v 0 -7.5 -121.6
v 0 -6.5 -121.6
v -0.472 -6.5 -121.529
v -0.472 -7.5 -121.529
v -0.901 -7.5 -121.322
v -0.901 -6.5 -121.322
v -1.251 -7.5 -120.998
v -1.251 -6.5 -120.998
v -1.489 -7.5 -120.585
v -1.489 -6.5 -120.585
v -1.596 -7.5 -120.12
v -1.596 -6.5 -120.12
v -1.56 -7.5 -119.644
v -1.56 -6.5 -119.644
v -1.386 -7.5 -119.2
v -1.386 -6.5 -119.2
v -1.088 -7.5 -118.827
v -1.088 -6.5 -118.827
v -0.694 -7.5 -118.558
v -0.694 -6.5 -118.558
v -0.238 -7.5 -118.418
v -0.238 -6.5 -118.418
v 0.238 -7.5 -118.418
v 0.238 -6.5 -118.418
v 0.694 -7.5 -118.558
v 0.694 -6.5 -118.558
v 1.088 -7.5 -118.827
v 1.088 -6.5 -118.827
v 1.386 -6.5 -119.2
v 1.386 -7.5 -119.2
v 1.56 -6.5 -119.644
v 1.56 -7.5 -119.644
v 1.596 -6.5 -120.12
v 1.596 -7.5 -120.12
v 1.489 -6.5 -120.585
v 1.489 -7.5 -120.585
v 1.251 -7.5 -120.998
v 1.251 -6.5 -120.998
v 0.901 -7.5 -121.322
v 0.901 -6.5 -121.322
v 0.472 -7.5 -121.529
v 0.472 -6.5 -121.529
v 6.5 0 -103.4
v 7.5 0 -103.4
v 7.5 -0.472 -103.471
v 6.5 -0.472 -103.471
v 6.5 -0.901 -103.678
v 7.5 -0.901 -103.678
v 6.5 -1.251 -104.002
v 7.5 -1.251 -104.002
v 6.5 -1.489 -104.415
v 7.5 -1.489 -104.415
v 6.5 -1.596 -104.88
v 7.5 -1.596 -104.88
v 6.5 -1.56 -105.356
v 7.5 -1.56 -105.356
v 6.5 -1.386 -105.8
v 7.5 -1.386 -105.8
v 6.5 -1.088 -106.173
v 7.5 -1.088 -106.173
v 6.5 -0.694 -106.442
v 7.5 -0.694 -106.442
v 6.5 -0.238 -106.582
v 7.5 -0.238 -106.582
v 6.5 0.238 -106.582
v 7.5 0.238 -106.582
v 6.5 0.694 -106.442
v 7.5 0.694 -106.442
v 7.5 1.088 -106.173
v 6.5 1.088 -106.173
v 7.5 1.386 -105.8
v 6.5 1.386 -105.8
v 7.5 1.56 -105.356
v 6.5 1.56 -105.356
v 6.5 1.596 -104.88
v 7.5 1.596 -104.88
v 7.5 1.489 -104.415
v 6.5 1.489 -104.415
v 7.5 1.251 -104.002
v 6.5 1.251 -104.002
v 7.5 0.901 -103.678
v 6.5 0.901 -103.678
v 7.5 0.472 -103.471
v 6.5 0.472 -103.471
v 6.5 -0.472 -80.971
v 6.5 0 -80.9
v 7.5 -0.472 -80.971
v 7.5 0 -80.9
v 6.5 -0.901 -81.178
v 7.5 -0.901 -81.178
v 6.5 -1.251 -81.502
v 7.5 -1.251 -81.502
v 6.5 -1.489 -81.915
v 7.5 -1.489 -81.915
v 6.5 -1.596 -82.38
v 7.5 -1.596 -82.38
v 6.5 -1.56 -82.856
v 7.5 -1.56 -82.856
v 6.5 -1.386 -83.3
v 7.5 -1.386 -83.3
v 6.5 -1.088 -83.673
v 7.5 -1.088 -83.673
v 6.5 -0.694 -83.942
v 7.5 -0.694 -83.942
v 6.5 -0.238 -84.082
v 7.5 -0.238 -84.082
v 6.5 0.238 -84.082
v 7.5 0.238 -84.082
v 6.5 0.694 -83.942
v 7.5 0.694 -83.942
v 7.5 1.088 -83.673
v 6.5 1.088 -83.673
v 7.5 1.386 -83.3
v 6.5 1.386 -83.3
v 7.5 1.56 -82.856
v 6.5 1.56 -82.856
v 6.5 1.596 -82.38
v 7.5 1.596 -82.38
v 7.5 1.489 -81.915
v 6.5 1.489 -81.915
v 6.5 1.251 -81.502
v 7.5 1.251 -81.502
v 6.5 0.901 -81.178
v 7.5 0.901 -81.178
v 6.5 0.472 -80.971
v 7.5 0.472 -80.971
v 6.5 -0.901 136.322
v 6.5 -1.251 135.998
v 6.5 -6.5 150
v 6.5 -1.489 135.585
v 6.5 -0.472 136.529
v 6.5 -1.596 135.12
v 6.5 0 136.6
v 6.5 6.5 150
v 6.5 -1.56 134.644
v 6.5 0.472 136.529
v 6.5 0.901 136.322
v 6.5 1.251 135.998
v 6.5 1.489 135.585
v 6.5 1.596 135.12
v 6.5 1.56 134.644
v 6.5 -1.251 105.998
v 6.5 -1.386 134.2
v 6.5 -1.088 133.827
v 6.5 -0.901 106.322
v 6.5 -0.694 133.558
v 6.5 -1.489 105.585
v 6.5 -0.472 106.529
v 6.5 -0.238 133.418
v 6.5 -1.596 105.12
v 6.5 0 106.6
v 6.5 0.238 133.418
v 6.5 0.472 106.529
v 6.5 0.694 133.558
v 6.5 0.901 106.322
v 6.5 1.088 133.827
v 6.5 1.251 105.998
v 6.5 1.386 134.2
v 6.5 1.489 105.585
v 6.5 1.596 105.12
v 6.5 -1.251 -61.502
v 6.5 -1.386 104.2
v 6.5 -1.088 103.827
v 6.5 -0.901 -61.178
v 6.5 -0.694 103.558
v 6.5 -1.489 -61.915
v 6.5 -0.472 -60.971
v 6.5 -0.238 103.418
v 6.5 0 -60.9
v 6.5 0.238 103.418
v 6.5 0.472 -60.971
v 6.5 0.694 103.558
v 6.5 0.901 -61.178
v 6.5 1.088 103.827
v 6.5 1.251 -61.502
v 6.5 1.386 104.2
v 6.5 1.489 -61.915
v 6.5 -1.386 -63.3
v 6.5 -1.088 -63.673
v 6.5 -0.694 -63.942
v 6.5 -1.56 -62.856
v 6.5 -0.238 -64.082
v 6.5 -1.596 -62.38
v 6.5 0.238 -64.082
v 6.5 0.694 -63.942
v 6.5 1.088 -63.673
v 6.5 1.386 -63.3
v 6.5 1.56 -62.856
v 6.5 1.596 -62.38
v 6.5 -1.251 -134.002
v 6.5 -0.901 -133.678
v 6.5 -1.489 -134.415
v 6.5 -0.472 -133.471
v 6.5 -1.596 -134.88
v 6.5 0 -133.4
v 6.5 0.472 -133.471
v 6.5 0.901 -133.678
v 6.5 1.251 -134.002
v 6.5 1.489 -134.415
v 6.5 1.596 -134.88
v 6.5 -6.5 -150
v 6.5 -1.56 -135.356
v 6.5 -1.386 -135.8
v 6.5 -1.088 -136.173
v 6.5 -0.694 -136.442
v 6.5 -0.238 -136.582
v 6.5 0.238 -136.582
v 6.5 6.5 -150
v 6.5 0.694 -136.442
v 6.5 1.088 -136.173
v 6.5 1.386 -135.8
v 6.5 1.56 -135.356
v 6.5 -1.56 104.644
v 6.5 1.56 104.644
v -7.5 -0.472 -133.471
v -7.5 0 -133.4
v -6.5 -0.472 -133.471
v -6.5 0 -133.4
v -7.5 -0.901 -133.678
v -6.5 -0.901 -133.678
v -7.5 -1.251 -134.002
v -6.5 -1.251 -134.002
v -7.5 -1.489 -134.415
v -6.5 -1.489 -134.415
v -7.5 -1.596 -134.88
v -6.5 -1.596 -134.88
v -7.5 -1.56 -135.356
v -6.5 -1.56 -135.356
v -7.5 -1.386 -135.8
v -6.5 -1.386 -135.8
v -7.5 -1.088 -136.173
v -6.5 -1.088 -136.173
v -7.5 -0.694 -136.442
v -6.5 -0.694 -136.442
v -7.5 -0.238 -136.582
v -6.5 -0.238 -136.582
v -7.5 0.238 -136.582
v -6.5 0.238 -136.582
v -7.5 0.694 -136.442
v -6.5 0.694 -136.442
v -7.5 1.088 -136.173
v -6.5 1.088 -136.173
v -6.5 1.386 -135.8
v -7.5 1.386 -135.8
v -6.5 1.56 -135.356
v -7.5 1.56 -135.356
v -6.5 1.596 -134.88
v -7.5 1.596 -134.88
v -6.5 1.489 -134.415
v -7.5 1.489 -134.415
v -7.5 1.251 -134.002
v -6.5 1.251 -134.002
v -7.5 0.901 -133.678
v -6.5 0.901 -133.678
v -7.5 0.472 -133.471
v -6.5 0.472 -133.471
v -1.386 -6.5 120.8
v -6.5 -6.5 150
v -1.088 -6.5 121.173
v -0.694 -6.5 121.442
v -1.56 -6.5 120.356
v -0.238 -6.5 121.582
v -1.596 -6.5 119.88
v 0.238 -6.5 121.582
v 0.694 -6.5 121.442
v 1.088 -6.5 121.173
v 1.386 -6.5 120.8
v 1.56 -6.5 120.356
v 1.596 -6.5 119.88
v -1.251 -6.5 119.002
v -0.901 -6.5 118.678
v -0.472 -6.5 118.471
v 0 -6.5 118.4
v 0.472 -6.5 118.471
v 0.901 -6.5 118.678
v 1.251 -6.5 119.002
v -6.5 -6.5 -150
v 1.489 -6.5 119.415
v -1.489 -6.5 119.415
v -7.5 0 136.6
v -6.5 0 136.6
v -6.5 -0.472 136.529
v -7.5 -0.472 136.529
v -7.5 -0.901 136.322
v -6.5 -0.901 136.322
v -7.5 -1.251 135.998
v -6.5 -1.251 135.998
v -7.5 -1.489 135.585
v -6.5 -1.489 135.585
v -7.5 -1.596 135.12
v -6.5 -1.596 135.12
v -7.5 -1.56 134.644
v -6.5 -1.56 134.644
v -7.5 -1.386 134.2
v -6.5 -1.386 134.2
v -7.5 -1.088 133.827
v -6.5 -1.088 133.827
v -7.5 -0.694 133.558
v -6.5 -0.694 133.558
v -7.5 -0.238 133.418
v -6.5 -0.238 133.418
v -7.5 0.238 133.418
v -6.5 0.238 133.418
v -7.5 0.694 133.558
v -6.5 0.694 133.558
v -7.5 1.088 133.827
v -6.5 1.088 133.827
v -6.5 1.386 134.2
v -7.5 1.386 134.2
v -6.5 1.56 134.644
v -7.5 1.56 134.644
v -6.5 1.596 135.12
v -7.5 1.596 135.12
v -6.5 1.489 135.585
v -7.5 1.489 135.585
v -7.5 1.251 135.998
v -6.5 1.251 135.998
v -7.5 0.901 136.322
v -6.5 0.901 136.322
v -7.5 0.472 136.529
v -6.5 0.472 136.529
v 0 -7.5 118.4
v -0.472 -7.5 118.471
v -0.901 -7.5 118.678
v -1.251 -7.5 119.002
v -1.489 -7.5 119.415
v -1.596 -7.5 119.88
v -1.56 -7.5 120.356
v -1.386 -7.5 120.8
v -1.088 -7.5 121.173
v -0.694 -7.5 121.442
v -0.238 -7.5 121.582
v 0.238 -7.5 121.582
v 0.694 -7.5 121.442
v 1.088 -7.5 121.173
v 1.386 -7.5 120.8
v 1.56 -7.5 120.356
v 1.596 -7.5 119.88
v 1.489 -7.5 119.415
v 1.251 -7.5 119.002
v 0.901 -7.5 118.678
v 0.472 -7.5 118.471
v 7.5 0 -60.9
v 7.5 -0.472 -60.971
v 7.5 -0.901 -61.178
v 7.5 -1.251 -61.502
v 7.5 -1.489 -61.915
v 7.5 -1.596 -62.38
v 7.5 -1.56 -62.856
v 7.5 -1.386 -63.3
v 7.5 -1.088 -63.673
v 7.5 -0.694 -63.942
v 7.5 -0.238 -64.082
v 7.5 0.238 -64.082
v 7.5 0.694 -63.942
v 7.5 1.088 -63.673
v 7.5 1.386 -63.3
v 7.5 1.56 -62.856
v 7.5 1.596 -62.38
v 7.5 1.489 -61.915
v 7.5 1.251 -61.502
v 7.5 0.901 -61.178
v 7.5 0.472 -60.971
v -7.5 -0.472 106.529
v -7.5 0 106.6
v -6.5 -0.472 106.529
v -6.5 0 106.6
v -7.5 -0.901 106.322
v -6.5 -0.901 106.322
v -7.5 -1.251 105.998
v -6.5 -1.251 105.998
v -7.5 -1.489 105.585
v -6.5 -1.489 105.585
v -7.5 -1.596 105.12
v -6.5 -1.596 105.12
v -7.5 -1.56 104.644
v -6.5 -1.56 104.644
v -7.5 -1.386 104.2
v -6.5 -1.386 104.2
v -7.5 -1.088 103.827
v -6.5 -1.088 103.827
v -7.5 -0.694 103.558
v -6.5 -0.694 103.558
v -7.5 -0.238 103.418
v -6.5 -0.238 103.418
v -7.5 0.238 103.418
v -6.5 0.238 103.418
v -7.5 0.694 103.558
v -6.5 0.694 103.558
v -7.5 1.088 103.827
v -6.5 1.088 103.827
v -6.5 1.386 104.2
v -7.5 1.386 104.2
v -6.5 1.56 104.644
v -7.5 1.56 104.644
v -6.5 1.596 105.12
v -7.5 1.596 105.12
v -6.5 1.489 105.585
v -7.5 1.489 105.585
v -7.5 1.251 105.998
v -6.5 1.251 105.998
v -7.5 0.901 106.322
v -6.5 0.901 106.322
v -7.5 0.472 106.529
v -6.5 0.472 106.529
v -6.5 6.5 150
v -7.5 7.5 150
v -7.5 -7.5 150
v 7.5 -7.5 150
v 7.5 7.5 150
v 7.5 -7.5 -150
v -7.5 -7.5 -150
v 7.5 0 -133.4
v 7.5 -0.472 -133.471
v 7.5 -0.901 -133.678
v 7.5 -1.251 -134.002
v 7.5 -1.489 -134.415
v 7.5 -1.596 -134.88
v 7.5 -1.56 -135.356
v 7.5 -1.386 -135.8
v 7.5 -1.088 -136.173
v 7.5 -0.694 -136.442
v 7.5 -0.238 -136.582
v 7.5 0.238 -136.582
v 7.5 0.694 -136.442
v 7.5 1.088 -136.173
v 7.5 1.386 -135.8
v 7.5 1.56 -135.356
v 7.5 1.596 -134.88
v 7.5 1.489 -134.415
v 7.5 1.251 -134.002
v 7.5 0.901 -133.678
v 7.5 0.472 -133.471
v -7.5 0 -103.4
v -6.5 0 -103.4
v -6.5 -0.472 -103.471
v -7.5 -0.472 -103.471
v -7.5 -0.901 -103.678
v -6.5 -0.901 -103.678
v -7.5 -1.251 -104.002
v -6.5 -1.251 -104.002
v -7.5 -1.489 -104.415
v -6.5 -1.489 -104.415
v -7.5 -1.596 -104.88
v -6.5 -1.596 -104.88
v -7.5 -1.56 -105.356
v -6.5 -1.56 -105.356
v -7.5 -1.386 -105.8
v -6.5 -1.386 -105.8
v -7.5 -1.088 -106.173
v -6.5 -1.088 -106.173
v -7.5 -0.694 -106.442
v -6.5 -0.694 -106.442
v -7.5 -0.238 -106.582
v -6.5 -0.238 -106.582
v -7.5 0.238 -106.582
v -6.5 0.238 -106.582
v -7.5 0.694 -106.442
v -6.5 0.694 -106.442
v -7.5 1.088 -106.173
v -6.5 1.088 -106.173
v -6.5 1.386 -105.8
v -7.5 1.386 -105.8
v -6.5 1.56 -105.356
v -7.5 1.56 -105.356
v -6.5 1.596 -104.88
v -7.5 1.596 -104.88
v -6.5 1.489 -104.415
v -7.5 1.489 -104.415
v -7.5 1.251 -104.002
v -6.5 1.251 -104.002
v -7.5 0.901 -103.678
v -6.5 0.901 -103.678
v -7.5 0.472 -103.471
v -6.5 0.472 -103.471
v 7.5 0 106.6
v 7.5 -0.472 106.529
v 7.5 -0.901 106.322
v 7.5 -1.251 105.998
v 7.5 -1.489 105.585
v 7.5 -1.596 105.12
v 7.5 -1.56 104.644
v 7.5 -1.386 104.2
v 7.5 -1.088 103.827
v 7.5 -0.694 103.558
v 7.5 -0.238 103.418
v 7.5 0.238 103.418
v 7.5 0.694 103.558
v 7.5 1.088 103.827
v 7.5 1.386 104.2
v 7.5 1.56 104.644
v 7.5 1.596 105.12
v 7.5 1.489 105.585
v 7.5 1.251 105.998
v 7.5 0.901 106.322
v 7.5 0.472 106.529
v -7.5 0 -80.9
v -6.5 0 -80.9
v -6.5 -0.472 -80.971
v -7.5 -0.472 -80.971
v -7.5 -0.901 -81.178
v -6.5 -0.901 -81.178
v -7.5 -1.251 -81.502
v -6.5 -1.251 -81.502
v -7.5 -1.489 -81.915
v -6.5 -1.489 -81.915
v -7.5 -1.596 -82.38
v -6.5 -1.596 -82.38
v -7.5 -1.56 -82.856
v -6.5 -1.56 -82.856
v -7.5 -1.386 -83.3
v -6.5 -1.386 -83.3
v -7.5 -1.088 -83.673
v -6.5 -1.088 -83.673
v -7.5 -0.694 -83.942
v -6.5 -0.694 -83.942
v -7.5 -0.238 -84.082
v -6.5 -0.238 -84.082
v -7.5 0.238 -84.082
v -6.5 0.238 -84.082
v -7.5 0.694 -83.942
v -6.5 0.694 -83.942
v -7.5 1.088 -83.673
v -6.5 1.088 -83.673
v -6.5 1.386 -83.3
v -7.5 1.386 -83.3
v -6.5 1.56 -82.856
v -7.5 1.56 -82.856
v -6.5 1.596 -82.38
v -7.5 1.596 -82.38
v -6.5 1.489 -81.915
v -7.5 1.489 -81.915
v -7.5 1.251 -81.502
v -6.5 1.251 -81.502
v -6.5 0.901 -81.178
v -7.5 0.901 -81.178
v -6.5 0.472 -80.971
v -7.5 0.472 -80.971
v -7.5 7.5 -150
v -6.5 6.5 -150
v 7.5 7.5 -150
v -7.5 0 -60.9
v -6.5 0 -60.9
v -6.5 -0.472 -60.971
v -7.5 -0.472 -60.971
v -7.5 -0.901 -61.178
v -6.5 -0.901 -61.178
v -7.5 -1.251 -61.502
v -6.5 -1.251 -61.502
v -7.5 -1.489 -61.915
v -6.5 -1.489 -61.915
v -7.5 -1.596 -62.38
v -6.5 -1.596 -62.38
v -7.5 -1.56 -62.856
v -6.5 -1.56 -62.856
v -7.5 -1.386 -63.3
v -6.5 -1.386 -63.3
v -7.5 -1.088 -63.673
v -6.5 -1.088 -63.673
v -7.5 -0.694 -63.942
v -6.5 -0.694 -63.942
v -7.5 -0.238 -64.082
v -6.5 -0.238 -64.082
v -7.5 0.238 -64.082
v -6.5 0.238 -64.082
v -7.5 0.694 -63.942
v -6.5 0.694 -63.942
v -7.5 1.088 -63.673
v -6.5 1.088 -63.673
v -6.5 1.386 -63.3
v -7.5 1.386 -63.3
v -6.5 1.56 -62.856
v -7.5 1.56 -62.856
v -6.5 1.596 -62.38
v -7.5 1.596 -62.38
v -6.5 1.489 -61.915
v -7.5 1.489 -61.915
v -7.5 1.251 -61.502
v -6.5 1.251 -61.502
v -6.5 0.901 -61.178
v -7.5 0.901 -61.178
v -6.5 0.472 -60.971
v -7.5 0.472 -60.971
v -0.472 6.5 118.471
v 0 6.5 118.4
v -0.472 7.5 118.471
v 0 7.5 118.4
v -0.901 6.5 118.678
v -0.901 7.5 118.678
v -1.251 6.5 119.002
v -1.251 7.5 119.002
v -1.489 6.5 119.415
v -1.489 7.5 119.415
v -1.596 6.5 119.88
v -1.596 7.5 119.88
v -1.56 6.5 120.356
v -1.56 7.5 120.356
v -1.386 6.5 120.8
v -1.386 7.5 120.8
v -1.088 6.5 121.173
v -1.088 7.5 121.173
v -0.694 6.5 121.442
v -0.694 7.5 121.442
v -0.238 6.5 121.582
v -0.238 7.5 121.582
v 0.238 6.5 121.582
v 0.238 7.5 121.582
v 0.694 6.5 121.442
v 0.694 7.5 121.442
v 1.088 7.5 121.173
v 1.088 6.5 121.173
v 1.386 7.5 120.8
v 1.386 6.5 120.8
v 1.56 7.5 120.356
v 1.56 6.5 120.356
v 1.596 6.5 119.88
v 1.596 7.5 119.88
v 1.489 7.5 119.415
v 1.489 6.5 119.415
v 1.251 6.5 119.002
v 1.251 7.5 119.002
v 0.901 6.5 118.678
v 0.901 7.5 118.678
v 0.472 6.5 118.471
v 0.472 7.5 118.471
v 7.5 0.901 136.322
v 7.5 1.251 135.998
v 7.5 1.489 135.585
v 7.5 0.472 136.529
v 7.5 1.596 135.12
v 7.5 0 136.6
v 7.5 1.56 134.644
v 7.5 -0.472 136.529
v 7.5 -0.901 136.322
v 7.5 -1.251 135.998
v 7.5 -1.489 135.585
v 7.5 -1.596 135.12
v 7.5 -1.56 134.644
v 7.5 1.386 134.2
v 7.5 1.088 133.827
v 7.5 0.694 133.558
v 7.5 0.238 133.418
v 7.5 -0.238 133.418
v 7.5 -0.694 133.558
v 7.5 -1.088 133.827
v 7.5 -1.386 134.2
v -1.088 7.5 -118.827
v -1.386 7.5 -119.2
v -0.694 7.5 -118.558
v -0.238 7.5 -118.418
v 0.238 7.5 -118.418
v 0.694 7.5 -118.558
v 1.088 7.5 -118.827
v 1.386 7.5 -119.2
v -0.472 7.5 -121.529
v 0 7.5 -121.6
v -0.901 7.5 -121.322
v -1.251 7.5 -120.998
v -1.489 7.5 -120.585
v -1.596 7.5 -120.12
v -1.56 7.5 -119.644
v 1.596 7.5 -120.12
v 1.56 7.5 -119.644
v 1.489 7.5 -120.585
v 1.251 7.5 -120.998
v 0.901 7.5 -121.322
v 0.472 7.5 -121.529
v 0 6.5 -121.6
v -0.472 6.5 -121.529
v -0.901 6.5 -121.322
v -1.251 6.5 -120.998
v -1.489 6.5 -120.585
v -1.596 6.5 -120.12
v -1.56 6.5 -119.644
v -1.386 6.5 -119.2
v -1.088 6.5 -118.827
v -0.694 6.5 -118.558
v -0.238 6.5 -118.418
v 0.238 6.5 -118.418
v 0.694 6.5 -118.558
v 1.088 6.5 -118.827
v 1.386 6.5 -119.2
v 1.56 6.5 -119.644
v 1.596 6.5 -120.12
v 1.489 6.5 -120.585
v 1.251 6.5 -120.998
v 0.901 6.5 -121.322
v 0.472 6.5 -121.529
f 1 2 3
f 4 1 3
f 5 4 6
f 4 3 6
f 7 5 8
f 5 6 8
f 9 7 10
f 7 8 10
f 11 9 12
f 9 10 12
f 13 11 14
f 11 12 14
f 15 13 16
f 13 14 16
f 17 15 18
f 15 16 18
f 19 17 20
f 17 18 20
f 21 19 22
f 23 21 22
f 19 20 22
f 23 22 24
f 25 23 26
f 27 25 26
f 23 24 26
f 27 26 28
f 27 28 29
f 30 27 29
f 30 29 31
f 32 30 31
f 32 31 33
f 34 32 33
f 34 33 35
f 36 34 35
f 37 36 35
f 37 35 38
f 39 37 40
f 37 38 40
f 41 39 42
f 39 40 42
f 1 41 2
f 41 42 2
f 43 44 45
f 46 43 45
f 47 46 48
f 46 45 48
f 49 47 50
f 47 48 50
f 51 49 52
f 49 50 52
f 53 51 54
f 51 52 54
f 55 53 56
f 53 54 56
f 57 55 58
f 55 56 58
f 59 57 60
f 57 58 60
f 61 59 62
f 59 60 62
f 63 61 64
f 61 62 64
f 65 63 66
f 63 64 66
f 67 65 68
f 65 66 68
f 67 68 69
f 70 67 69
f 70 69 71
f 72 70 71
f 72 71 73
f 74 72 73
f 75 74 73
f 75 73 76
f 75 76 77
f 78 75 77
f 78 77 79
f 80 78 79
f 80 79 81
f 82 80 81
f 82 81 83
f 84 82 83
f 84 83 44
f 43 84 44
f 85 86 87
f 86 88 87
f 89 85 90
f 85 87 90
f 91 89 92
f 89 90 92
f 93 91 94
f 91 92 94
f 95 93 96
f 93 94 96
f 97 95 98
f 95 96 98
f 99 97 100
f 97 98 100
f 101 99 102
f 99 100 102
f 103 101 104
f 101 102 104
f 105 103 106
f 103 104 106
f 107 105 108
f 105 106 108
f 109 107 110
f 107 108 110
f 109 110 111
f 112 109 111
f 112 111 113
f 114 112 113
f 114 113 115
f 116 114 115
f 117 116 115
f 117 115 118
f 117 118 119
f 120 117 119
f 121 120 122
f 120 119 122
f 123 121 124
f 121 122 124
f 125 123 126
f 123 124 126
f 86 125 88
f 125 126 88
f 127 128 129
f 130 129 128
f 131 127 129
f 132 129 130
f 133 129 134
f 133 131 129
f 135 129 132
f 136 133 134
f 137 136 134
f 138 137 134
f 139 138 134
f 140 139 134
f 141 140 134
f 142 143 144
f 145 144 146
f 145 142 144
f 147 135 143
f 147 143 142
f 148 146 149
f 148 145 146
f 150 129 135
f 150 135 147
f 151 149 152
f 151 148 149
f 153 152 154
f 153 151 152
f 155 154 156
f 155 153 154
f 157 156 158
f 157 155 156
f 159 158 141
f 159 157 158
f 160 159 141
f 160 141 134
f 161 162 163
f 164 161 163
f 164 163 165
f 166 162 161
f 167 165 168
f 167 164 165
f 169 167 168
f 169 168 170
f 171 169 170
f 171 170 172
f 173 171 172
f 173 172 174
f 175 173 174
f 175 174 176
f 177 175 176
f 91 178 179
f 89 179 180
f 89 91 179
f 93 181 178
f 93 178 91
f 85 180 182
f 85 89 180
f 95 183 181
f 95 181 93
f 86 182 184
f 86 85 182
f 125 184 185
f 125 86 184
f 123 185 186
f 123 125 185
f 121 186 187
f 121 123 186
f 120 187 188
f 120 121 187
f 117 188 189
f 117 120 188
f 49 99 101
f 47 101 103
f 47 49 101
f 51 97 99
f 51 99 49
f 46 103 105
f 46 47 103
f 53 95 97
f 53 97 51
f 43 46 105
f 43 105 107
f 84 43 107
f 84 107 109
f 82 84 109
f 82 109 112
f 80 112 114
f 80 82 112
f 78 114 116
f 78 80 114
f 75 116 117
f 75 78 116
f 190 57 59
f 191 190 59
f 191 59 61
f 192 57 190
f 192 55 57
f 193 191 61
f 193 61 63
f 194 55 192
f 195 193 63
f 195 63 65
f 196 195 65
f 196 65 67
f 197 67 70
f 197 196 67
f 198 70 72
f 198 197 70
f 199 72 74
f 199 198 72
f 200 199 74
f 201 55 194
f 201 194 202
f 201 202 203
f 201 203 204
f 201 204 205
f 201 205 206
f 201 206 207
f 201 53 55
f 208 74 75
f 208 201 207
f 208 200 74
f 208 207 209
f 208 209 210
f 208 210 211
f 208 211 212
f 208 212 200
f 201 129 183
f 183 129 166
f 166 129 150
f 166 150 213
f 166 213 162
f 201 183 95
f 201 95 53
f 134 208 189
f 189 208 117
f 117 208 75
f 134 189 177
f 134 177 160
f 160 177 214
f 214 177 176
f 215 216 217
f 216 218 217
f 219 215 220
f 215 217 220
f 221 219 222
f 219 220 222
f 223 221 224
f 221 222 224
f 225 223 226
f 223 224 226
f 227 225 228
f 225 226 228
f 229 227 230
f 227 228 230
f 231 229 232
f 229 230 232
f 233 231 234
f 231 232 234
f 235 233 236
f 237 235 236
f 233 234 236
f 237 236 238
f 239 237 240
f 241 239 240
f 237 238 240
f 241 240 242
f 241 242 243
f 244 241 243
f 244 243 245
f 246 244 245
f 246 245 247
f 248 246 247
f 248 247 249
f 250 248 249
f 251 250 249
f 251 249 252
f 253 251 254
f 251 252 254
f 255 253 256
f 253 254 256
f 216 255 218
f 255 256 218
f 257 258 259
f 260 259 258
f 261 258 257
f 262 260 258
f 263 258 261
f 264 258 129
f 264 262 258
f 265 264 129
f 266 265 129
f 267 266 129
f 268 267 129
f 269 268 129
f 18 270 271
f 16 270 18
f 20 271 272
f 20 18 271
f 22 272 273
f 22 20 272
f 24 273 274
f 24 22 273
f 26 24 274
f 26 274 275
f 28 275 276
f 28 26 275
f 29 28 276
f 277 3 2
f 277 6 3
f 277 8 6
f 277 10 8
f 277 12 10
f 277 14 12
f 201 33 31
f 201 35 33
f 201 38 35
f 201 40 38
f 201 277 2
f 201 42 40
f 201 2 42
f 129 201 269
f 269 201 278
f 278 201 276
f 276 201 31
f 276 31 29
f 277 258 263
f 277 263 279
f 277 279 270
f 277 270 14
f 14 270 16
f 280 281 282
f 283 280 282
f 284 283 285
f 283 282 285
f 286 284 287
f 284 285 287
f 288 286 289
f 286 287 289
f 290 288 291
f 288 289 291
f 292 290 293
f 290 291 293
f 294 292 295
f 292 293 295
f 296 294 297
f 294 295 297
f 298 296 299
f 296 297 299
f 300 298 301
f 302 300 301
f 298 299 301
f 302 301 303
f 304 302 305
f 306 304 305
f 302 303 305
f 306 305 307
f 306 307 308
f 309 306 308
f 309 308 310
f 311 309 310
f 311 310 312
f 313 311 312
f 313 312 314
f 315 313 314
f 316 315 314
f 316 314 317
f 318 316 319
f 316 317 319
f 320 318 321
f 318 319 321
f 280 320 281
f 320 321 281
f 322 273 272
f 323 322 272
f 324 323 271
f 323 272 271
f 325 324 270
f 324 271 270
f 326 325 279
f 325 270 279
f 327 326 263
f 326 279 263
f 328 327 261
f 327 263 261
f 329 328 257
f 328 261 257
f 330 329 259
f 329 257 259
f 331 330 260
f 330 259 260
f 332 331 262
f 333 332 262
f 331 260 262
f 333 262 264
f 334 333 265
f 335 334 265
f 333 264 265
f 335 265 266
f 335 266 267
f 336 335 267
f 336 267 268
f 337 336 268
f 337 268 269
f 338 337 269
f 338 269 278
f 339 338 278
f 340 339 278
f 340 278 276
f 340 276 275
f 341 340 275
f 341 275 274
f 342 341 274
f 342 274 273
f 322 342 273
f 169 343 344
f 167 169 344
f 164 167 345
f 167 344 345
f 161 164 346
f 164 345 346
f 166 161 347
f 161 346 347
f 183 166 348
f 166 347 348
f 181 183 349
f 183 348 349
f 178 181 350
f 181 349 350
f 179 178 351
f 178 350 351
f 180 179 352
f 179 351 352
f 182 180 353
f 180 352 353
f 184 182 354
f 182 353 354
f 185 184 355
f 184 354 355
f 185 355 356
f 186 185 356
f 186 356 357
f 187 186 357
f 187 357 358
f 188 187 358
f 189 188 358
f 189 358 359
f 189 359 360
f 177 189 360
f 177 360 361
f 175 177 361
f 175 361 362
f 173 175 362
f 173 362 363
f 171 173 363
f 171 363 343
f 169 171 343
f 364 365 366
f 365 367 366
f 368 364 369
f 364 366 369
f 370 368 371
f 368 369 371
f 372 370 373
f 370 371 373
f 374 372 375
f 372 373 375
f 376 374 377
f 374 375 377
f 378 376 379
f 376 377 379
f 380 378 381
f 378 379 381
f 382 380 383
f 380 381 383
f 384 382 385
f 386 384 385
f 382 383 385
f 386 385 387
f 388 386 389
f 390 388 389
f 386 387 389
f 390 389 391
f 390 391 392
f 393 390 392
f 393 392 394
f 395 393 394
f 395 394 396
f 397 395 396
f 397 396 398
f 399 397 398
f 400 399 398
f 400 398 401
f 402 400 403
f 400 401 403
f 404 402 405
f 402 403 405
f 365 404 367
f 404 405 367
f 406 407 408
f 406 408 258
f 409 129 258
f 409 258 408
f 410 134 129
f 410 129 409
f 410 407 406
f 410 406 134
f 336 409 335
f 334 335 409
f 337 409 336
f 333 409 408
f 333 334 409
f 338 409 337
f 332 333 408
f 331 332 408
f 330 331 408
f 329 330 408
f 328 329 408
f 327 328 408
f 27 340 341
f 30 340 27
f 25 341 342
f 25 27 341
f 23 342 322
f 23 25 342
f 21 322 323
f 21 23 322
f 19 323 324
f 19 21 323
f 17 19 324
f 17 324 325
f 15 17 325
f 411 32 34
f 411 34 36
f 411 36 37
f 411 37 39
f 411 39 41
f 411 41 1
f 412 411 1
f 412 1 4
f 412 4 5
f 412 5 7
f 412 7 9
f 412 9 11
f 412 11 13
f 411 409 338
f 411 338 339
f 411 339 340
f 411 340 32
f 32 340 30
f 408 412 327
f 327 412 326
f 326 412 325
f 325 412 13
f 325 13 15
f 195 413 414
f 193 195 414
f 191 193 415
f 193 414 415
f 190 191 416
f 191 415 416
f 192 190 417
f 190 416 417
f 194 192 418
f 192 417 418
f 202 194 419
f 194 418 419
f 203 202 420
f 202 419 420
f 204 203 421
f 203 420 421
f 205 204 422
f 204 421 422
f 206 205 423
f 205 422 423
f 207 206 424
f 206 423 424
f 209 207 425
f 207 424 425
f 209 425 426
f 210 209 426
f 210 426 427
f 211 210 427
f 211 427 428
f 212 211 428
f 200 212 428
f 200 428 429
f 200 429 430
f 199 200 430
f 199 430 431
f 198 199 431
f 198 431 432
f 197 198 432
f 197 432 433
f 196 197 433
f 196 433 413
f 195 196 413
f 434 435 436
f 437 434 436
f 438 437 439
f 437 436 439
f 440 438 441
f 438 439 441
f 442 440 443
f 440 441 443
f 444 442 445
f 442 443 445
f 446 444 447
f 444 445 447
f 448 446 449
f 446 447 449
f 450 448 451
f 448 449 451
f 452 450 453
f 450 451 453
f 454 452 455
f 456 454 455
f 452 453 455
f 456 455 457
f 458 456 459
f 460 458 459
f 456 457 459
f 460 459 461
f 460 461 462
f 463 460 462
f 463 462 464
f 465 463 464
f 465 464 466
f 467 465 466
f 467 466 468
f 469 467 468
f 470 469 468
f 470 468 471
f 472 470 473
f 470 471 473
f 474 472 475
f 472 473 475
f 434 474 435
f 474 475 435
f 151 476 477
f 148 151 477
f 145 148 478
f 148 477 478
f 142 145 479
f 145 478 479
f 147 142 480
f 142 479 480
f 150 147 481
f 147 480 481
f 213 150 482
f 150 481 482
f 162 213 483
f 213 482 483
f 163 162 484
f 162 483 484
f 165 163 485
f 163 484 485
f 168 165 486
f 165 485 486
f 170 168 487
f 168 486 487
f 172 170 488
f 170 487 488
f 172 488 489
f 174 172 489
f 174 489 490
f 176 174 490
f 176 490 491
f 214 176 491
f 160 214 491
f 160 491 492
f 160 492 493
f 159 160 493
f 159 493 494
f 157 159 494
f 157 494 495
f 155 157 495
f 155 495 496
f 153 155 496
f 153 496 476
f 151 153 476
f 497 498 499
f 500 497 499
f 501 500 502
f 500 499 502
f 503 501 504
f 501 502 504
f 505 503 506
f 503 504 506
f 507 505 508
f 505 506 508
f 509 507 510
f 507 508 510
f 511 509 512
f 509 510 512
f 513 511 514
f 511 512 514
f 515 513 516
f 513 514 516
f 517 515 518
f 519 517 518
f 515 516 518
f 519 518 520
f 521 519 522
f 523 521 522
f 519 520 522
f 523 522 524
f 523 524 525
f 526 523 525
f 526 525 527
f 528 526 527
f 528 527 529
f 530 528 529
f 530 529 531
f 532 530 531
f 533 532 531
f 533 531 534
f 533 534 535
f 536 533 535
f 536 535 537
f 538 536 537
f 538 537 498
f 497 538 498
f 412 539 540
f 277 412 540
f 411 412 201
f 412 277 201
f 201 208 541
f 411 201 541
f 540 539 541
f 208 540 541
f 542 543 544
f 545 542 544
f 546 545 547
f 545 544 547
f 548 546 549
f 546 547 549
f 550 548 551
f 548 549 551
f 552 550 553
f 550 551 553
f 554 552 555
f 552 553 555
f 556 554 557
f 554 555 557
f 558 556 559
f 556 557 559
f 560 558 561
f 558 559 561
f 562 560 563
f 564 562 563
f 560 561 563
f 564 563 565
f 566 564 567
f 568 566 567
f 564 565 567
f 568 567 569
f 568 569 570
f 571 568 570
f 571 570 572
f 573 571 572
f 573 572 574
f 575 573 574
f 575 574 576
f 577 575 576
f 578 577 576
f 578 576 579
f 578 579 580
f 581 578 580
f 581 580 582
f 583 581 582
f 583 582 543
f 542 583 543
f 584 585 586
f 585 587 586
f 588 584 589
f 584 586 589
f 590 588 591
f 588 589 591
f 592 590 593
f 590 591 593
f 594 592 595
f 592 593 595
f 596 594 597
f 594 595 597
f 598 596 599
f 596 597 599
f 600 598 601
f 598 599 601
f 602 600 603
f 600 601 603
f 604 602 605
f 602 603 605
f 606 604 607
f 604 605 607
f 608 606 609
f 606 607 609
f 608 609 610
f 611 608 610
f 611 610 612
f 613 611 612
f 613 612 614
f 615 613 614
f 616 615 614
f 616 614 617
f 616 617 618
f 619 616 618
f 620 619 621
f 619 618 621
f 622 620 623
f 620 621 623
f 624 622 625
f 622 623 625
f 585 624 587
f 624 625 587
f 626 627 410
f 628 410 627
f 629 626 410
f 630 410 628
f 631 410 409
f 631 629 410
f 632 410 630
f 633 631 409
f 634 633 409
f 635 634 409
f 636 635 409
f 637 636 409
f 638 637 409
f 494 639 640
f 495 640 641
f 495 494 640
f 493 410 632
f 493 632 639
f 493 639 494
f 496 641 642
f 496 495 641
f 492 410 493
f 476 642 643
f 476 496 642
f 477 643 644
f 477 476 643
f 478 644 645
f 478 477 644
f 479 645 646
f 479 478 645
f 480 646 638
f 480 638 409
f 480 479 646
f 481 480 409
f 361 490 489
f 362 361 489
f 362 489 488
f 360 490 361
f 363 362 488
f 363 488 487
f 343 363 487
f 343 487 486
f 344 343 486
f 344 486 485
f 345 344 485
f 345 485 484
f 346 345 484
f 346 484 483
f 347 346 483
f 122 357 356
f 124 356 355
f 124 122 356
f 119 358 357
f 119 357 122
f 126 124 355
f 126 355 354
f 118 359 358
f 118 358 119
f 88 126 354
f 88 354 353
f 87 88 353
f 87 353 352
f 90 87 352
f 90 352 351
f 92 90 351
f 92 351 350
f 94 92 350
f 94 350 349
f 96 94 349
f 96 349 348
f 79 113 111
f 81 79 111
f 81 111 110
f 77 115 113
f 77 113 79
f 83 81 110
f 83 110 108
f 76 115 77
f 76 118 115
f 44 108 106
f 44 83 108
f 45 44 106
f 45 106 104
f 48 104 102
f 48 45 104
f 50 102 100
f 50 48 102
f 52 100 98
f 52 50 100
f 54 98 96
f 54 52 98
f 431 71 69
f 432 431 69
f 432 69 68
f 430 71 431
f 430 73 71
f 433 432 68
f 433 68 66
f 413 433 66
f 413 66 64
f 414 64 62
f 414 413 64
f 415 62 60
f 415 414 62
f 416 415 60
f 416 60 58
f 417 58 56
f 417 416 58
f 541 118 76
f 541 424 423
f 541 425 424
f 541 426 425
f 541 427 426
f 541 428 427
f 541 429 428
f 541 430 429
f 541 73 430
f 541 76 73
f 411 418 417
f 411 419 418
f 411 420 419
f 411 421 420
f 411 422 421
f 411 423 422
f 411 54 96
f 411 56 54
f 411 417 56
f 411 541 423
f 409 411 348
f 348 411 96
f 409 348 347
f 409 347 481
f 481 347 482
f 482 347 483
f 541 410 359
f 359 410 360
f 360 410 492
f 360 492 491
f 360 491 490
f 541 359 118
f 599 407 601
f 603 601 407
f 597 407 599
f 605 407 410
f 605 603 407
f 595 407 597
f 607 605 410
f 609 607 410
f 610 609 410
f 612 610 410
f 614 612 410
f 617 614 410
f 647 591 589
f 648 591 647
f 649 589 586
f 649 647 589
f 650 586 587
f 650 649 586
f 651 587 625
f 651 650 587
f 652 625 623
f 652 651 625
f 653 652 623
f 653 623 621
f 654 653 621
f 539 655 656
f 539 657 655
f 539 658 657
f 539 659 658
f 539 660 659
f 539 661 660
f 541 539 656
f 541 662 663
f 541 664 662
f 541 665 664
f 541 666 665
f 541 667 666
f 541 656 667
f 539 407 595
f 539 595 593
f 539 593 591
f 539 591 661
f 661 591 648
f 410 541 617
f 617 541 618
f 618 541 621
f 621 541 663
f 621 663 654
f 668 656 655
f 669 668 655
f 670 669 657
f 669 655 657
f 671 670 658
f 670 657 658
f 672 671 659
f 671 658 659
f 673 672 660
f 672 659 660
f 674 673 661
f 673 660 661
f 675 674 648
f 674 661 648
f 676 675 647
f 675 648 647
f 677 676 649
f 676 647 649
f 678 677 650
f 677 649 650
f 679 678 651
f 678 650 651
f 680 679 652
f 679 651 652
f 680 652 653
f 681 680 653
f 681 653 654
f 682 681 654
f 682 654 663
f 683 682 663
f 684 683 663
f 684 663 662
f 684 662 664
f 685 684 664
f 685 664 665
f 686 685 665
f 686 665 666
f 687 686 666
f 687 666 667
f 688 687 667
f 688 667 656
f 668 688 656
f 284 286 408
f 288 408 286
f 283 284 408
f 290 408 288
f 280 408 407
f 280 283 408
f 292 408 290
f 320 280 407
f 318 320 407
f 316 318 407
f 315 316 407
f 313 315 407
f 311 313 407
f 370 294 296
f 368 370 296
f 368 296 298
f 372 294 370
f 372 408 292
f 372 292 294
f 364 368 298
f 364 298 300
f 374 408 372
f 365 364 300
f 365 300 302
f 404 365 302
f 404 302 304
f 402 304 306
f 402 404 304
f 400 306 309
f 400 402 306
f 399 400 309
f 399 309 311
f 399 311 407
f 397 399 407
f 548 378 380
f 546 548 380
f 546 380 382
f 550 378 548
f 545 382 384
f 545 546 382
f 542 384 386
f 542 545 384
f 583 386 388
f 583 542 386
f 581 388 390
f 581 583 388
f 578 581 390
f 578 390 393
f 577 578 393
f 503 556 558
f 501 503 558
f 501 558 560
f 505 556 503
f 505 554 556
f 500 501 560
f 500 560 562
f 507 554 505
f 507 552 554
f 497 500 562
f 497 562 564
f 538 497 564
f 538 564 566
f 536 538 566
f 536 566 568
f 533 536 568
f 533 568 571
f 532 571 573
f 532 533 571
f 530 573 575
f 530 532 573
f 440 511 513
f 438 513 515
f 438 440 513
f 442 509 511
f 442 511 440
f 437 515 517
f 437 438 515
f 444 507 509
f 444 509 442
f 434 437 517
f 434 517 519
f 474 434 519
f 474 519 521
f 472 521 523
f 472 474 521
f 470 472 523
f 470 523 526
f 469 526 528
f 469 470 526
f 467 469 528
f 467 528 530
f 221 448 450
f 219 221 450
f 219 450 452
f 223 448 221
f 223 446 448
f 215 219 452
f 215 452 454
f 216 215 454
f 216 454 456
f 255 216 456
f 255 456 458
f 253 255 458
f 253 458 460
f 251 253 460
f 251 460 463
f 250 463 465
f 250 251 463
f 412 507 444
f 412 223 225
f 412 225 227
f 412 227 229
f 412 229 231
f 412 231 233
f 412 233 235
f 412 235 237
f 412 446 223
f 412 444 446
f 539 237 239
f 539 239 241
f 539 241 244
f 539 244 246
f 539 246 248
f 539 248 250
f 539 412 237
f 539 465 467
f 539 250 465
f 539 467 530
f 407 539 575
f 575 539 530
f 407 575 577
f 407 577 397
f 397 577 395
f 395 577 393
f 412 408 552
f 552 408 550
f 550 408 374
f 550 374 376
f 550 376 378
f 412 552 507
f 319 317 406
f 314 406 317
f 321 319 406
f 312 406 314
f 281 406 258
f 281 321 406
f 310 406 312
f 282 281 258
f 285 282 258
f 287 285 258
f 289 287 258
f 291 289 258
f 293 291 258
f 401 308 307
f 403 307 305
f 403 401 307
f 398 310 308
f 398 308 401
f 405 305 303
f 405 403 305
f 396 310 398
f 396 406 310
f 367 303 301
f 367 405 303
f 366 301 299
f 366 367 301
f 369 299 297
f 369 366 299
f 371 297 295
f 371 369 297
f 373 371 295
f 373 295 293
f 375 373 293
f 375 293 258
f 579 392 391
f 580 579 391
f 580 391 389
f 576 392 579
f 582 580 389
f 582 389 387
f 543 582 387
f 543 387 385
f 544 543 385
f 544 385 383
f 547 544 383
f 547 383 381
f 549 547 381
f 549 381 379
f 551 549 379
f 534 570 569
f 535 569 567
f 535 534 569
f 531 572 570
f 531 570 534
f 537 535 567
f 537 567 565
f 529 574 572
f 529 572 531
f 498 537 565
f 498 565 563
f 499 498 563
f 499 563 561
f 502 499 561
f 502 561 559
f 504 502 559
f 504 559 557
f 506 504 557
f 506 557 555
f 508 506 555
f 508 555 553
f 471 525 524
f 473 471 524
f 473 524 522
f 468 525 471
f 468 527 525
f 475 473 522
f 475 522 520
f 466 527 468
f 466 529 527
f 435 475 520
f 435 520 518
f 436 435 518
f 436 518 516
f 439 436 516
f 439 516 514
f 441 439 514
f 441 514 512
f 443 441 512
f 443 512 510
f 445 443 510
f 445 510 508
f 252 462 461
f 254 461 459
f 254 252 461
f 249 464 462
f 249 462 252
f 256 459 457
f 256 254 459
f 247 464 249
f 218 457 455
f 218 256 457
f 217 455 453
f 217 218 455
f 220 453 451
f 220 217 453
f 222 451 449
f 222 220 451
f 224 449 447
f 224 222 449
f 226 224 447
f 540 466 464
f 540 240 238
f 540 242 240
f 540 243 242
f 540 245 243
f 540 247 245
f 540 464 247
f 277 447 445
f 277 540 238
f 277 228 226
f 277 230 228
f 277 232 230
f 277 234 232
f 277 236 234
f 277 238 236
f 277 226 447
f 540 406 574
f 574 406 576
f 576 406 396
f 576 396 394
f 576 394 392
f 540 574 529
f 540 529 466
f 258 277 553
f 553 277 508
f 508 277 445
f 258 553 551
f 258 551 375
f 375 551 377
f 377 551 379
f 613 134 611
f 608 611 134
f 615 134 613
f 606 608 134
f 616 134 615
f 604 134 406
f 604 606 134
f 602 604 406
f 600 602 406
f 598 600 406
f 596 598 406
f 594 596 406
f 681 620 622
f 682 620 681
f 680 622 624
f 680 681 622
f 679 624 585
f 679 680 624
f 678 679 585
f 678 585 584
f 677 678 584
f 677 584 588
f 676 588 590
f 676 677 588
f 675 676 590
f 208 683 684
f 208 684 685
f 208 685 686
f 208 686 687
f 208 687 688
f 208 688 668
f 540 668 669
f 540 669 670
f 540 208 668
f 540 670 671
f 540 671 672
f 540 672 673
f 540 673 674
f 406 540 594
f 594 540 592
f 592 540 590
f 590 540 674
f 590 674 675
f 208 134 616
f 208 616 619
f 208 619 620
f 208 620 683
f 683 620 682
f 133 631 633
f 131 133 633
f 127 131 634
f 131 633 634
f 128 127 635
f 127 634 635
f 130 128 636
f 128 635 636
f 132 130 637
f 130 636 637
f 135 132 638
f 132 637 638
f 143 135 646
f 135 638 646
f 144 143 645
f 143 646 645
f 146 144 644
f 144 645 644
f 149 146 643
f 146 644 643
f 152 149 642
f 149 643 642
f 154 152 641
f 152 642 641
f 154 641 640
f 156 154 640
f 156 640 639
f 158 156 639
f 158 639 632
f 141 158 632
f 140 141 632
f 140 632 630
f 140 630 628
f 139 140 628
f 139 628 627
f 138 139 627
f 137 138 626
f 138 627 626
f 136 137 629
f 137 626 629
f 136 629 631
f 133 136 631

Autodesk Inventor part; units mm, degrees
ref_plane "YZ Plane" through (0, 0, 0) normal (1, 0, 0) x (0, 1, 0)
ref_plane "XZ Plane" through (0, 0, 0) normal (0, 1, 0) x (-1, 0, 0)
ref_plane "XY Plane" through (0, 0, 0) normal (0, 0, 1) x (1, 0, 0)
sketch "スケッチ1" plane through (0, 0, 0) normal (0, 0, 1) x (1, 0, 0)
  line L0 (-7.5, 7.5) -> (7.5, 7.5)
  line L1 (7.5, 7.5) -> (7.5, -7.5)
  line L2 (7.5, -7.5) -> (-7.5, -7.5)
  line L3 (-7.5, -7.5) -> (-7.5, 7.5)
  line L4 (-7.5, 7.5) -> (7.5, -7.5) construction
  line L5 (7.5, 7.5) -> (-7.5, -7.5) construction
  line L6 (-6.5, -6.5) -> (6.5, -6.5)
  line L7 (6.5, -6.5) -> (6.5, 6.5)
  line L8 (6.5, 6.5) -> (-6.5, 6.5)
  line L9 (-6.5, 6.5) -> (-6.5, -6.5)
  point P0 (0, 0)
  dimension "d0" = 15
  dimension "d1" = 15
extrude "押し出し1" add sketch "スケッチ1" along normal mid plane 300
sketch "スケッチ2" plane through (-7.5, -7.5, 150) normal (0, -1, 0) x (1, 0, 0)
  line L0 (7.5, -270) -> (7.5, -30)
  point P0 (7.5, -150)
  point P1 (7.5, -150)
  dimension "d4" = 240
hole "穴1" at (0, -7.5, 120) at (0, -7.5, -120) direction (0, 1, 0) diameter 3.2 end through all
sketch "スケッチ3" plane through (-7.5, -7.5, 150) normal (-1, 0, 0) x (0, 0, 1)
  line L0 (-285, 7.5) -> (-15, 7.5)
  line L1 (-259.5, -0.1) -> (-259.5, -80.1) projected
  point P0 (-150, 7.5)
  point P1 (-150, 7.5)
  point P2 (-45, 7.5)
  point P3 (-255, 7.5)
  point P4 (-232.5, 7.5)
  point P5 (-212.5, 7.5)
  dimension "d12" = 270
  dimension "d21" = 30
  dimension "d22" = 30
  dimension "d23" = 20
  dimension "d24" = 27
hole "穴2" at (-7.5, 0, -135) at (-7.5, 0, 135) at (-7.5, 0, -105) at (-7.5, 0, 105) at (-7.5, 0, -62.5) at (-7.5, 0, -82.5) direction (1, 0, 0) diameter 3.2 end through all
equation "\"d22\" = d21"
properties part number "回路角柱"
